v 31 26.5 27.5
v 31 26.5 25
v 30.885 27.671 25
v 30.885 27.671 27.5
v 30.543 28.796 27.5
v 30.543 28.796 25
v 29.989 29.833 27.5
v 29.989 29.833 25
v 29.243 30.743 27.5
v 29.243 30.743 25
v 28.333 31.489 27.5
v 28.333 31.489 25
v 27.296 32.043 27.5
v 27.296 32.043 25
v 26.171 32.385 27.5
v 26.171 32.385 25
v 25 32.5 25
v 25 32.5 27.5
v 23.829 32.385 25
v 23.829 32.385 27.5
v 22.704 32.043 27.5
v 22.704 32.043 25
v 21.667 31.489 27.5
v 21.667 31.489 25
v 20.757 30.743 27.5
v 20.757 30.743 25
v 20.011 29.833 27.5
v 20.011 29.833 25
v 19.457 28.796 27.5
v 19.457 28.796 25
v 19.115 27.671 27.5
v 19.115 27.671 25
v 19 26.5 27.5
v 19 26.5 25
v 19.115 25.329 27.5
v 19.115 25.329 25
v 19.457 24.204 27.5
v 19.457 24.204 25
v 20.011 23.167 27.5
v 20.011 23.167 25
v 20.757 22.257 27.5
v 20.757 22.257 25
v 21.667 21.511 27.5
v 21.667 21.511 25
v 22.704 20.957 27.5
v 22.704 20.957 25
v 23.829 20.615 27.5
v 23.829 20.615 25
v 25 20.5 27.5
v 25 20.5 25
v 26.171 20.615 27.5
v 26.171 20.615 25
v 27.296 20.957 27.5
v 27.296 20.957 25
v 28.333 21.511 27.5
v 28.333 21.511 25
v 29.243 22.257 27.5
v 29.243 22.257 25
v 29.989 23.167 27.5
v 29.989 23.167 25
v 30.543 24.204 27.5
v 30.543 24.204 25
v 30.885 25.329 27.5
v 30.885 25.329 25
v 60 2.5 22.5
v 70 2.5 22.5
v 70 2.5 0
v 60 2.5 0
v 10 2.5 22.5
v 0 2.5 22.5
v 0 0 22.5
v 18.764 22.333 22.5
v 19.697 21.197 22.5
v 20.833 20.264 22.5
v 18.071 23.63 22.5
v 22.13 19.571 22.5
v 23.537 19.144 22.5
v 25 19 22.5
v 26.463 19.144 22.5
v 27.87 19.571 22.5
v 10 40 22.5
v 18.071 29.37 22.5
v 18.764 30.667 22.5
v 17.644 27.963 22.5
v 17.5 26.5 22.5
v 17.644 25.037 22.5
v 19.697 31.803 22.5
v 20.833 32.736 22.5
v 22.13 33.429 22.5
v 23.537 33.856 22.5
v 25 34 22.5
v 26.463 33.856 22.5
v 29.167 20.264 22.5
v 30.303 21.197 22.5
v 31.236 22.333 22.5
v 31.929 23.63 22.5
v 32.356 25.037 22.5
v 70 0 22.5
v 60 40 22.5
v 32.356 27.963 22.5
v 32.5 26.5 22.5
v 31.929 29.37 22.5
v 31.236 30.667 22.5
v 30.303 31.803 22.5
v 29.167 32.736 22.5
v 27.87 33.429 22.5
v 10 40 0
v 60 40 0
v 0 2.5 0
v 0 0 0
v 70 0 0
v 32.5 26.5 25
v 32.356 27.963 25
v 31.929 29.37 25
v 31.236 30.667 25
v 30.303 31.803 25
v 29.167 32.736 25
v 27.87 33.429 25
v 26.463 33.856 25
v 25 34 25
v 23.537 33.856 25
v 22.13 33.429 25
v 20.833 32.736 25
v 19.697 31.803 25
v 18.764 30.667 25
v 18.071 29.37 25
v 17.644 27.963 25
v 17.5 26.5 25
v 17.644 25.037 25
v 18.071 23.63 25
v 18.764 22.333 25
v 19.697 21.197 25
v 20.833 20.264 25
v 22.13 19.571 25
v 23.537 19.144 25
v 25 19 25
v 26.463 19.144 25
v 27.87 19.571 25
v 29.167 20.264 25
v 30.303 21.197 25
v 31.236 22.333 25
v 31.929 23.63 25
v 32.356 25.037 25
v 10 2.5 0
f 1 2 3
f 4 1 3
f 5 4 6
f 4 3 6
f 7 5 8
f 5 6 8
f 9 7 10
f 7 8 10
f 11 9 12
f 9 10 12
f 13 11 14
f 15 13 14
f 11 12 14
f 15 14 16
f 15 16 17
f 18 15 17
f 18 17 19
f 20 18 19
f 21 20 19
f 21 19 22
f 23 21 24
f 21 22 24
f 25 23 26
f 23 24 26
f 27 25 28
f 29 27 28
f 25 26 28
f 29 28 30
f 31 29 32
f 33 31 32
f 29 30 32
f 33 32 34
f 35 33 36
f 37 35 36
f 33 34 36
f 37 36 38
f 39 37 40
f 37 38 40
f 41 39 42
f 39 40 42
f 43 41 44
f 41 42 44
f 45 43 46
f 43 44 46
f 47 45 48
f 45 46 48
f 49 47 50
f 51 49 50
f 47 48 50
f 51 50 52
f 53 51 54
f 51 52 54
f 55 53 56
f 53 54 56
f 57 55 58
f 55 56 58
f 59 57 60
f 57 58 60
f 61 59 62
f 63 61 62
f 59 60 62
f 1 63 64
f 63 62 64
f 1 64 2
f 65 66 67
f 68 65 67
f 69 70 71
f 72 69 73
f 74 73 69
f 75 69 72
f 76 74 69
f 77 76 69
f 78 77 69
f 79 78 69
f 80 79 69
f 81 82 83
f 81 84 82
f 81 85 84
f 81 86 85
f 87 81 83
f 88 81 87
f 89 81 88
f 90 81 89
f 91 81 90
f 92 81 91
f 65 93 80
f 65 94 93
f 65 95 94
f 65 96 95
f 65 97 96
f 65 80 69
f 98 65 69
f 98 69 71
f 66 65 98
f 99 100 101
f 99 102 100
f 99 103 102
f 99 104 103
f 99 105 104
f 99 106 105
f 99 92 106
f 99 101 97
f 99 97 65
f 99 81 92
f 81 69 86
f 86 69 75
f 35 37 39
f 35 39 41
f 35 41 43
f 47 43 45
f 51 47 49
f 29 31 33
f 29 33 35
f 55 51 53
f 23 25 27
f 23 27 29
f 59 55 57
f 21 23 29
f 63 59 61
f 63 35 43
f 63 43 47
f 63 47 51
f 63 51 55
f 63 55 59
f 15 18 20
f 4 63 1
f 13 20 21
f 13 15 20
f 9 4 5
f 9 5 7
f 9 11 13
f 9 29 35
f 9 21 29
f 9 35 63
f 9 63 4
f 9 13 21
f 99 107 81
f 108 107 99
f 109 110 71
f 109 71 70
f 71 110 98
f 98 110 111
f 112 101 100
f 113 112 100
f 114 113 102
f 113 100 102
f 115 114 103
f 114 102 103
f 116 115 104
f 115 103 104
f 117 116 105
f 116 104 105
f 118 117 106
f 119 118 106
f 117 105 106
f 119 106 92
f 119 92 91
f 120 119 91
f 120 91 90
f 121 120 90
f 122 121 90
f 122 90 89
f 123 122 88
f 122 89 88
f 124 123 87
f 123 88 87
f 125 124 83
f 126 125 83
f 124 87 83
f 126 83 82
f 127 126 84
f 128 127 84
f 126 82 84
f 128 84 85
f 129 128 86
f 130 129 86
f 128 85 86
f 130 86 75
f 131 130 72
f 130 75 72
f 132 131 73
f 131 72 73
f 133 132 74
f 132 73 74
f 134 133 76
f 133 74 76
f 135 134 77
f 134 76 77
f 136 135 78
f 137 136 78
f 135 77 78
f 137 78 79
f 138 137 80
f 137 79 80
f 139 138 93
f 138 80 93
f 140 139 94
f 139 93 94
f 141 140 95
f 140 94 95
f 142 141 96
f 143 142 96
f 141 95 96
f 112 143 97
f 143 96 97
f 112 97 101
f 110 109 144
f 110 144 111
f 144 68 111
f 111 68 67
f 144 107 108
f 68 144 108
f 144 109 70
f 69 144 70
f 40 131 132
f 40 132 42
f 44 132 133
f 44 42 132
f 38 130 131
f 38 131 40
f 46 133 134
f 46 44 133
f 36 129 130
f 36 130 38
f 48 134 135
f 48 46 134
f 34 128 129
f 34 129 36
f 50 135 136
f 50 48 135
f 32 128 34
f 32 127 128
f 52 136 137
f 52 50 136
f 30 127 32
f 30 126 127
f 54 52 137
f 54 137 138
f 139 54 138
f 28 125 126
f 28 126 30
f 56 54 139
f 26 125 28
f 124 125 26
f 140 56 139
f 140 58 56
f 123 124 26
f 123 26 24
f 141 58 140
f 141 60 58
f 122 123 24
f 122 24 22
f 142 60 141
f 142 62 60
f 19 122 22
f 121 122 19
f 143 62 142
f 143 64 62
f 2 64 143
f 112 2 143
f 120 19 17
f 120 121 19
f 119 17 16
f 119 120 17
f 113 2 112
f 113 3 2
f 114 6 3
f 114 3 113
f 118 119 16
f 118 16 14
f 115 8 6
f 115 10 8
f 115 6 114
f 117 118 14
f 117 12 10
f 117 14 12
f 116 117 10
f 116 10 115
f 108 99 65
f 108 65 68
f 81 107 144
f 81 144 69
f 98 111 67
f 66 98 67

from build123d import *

# Parameters (mm, degrees)
SKETCH1_W           = 70
SKETCH1_H           = 40
BOSS_EXTRUDE1_DEPTH = 22.5
SKETCH2_R           = 7.5
BOSS_EXTRUDE2_DEPTH = 2.5
SKETCH3_R           = 6
BOSS_EXTRUDE3_DEPTH = 2.5
SKETCH4_W           = 22.5
SKETCH4_H           = 37.5
CUT_EXTRUDE1_DEPTH  = 10
SKETCH5_W           = 22.5
SKETCH5_H           = 37.5
CUT_EXTRUDE2_DEPTH  = 10


with BuildPart() as part:
    # Sketch1 → Boss-Extrude1 (new body)
    with BuildSketch(Plane.XY):
        with Locations((35, 20)):
            Rectangle(SKETCH1_W, SKETCH1_H)
    extrude(amount=BOSS_EXTRUDE1_DEPTH)

    # Sketch2 → Boss-Extrude2 (add)
    with BuildSketch(Plane.XY.offset(22.5)):
        with Locations((25, 26.5)):
            Circle(SKETCH2_R)
    extrude(amount=BOSS_EXTRUDE2_DEPTH)

    # Sketch3 → Boss-Extrude3 (add)
    with BuildSketch(Plane.XY.offset(25)):
        with Locations((25, 26.5)):
            Circle(SKETCH3_R)
    extrude(amount=BOSS_EXTRUDE3_DEPTH)

    # Sketch4 → Cut-Extrude1 (cut)
    with BuildSketch(Plane.ZY):
        with Locations((11.25, 21.25)):
            Rectangle(SKETCH4_W, SKETCH4_H)
    extrude(amount=-CUT_EXTRUDE1_DEPTH, mode=Mode.SUBTRACT)

    # Sketch5 → Cut-Extrude2 (cut)
    with BuildSketch(Plane(origin=(70, 0, 0), x_dir=(0, 0, -1), z_dir=(1, 0, 0))):
        with Locations((-11.25, 21.25)):
            Rectangle(SKETCH5_W, SKETCH5_H)
    extrude(amount=-CUT_EXTRUDE2_DEPTH, mode=Mode.SUBTRACT)


solid = part.part
